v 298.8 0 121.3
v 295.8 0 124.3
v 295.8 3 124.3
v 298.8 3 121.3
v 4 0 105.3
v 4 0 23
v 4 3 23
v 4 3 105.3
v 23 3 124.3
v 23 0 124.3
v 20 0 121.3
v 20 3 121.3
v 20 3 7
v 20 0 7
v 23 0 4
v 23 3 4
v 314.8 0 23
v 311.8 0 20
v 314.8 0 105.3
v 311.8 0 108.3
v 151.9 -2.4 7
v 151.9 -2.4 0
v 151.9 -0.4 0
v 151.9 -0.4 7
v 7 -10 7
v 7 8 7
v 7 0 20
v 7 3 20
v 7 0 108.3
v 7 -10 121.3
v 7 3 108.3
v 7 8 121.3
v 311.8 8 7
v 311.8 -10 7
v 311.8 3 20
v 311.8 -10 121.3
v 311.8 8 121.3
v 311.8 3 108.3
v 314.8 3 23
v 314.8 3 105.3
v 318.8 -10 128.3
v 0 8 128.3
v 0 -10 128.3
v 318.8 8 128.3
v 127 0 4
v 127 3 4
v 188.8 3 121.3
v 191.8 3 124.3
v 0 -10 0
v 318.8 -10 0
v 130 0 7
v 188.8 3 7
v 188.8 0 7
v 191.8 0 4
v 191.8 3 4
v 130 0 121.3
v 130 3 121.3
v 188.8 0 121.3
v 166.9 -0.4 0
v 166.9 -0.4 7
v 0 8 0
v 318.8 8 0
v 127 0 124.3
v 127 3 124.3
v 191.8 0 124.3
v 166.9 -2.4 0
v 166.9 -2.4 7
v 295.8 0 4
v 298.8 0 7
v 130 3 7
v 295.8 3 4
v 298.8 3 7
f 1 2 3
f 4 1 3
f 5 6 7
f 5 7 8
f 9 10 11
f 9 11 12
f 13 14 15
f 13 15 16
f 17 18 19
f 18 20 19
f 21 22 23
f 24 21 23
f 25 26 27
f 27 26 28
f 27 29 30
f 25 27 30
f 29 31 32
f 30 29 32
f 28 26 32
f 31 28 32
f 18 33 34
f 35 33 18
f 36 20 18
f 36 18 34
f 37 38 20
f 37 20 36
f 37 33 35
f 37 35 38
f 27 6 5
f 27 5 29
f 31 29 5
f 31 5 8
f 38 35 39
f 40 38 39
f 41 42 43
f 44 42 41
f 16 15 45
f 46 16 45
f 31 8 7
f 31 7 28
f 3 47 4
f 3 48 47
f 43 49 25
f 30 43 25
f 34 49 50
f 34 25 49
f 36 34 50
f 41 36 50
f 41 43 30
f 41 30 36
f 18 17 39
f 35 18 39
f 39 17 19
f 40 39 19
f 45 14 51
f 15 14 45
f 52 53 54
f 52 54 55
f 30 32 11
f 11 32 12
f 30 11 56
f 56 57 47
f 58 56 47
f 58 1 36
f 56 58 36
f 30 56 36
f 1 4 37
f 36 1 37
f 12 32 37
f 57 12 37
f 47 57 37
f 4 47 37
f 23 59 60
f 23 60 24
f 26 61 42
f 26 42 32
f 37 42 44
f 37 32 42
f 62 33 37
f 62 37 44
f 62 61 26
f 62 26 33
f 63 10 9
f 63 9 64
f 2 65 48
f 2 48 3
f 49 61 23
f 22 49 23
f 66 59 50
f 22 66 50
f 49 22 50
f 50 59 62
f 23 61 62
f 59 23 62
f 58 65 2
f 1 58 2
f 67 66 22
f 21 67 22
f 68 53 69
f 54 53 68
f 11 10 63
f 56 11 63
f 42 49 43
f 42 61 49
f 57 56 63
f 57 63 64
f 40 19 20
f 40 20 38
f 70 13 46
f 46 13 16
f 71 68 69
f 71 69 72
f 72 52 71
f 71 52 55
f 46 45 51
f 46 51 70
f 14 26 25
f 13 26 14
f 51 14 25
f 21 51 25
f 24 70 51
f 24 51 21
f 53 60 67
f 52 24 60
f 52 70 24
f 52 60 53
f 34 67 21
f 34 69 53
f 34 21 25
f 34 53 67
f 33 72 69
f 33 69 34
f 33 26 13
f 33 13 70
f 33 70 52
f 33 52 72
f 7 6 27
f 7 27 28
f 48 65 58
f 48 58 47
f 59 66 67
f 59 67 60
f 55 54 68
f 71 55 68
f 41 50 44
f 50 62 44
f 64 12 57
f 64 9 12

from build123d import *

# Parameters (mm, degrees)
SKETCH1_W           = 318.8
SKETCH1_H           = 128.3
SKETCH1_W_2         = 304.8
SKETCH1_H_2         = 114.3
BOSS_EXTRUDE1_DEPTH = 8
SKETCH2_W           = 110
SKETCH2_H           = 3
SKETCH2_W_2         = 3
SKETCH2_H_2         = 88.3
CUT_EXTRUDE1_DEPTH  = 3
CHAMFER1_SIZE       = 3
SKETCH3_W           = 318.8
SKETCH3_H           = 128.3
SKETCH3_W_2         = 304.8
SKETCH3_H_2         = 114.3
BOSS_EXTRUDE3_DEPTH = 10
SKETCH4_W           = 15
SKETCH4_H           = 2
CUT_EXTRUDE3_DEPTH  = 7


with BuildPart() as part:
    # Sketch1 → Boss-Extrude1 (new body)
    with BuildSketch(Plane(origin=(0, 0, 0), x_dir=(1, 0, 0), z_dir=(0, 1, 0))):
        with Locations((159.4, -64.15)):
            Rectangle(SKETCH1_W, SKETCH1_H)
        with Locations((159.4, -64.15)):
            Rectangle(SKETCH1_W_2, SKETCH1_H_2, mode=Mode.SUBTRACT)
    extrude(amount=BOSS_EXTRUDE1_DEPTH)

    # Sketch2 → Cut-Extrude1 (cut)
    with BuildSketch(Plane.XZ):
        with Locations((75, 122.8)):
            Rectangle(SKETCH2_W, SKETCH2_H)
        with Locations((5.5, 64.15)):
            Rectangle(SKETCH2_W_2, SKETCH2_H_2)
        with Locations((313.3, 64.15)):
            Rectangle(SKETCH2_W_2, SKETCH2_H_2)
        with Locations((75, 5.5)):
            Rectangle(SKETCH2_W, SKETCH2_H)
        with Locations((243.8, 5.5)):
            Rectangle(SKETCH2_W, SKETCH2_H)
        with Locations((243.8, 122.8)):
            Rectangle(SKETCH2_W, SKETCH2_H)
    extrude(amount=-CUT_EXTRUDE1_DEPTH, mode=Mode.SUBTRACT)

    # Chamfer1
    chamfer1_edges = [part.edges().sort_by_distance(p)[0] for p in [
        (298.8, 1.5, 4),
        (314.8, 1.5, 20),
        (130, 1.5, 4),
        (188.8, 1.5, 4),
        (20, 1.5, 4),
        (4, 1.5, 20),
        (4, 1.5, 108.3),
        (314.8, 1.5, 108.3),
        (298.8, 1.5, 124.3),
        (188.8, 1.5, 124.3),
        (130, 1.5, 124.3),
        (20, 1.5, 124.3),
    ]]
    chamfer(chamfer1_edges, length=CHAMFER1_SIZE - 0.0001)  # a hair under: the kernel refuses the full size

    # Sketch3 → Boss-Extrude3 (add)
    with BuildSketch(Plane.XZ):
        with Locations((159.4, 64.15)):
            Rectangle(SKETCH3_W, SKETCH3_H)
        with Locations((159.4, 64.15)):
            Rectangle(SKETCH3_W_2, SKETCH3_H_2, mode=Mode.SUBTRACT)
    extrude(amount=BOSS_EXTRUDE3_DEPTH)

    # Sketch4 → Cut-Extrude3 (cut)
    with BuildSketch(Plane(origin=(0, 0, 0), x_dir=(-1, 0, 0), z_dir=(0, 0, -1))):
        with Locations((-159.4, -1.4)):
            Rectangle(SKETCH4_W, SKETCH4_H)
    extrude(amount=-CUT_EXTRUDE3_DEPTH, mode=Mode.SUBTRACT)


solid = part.part
